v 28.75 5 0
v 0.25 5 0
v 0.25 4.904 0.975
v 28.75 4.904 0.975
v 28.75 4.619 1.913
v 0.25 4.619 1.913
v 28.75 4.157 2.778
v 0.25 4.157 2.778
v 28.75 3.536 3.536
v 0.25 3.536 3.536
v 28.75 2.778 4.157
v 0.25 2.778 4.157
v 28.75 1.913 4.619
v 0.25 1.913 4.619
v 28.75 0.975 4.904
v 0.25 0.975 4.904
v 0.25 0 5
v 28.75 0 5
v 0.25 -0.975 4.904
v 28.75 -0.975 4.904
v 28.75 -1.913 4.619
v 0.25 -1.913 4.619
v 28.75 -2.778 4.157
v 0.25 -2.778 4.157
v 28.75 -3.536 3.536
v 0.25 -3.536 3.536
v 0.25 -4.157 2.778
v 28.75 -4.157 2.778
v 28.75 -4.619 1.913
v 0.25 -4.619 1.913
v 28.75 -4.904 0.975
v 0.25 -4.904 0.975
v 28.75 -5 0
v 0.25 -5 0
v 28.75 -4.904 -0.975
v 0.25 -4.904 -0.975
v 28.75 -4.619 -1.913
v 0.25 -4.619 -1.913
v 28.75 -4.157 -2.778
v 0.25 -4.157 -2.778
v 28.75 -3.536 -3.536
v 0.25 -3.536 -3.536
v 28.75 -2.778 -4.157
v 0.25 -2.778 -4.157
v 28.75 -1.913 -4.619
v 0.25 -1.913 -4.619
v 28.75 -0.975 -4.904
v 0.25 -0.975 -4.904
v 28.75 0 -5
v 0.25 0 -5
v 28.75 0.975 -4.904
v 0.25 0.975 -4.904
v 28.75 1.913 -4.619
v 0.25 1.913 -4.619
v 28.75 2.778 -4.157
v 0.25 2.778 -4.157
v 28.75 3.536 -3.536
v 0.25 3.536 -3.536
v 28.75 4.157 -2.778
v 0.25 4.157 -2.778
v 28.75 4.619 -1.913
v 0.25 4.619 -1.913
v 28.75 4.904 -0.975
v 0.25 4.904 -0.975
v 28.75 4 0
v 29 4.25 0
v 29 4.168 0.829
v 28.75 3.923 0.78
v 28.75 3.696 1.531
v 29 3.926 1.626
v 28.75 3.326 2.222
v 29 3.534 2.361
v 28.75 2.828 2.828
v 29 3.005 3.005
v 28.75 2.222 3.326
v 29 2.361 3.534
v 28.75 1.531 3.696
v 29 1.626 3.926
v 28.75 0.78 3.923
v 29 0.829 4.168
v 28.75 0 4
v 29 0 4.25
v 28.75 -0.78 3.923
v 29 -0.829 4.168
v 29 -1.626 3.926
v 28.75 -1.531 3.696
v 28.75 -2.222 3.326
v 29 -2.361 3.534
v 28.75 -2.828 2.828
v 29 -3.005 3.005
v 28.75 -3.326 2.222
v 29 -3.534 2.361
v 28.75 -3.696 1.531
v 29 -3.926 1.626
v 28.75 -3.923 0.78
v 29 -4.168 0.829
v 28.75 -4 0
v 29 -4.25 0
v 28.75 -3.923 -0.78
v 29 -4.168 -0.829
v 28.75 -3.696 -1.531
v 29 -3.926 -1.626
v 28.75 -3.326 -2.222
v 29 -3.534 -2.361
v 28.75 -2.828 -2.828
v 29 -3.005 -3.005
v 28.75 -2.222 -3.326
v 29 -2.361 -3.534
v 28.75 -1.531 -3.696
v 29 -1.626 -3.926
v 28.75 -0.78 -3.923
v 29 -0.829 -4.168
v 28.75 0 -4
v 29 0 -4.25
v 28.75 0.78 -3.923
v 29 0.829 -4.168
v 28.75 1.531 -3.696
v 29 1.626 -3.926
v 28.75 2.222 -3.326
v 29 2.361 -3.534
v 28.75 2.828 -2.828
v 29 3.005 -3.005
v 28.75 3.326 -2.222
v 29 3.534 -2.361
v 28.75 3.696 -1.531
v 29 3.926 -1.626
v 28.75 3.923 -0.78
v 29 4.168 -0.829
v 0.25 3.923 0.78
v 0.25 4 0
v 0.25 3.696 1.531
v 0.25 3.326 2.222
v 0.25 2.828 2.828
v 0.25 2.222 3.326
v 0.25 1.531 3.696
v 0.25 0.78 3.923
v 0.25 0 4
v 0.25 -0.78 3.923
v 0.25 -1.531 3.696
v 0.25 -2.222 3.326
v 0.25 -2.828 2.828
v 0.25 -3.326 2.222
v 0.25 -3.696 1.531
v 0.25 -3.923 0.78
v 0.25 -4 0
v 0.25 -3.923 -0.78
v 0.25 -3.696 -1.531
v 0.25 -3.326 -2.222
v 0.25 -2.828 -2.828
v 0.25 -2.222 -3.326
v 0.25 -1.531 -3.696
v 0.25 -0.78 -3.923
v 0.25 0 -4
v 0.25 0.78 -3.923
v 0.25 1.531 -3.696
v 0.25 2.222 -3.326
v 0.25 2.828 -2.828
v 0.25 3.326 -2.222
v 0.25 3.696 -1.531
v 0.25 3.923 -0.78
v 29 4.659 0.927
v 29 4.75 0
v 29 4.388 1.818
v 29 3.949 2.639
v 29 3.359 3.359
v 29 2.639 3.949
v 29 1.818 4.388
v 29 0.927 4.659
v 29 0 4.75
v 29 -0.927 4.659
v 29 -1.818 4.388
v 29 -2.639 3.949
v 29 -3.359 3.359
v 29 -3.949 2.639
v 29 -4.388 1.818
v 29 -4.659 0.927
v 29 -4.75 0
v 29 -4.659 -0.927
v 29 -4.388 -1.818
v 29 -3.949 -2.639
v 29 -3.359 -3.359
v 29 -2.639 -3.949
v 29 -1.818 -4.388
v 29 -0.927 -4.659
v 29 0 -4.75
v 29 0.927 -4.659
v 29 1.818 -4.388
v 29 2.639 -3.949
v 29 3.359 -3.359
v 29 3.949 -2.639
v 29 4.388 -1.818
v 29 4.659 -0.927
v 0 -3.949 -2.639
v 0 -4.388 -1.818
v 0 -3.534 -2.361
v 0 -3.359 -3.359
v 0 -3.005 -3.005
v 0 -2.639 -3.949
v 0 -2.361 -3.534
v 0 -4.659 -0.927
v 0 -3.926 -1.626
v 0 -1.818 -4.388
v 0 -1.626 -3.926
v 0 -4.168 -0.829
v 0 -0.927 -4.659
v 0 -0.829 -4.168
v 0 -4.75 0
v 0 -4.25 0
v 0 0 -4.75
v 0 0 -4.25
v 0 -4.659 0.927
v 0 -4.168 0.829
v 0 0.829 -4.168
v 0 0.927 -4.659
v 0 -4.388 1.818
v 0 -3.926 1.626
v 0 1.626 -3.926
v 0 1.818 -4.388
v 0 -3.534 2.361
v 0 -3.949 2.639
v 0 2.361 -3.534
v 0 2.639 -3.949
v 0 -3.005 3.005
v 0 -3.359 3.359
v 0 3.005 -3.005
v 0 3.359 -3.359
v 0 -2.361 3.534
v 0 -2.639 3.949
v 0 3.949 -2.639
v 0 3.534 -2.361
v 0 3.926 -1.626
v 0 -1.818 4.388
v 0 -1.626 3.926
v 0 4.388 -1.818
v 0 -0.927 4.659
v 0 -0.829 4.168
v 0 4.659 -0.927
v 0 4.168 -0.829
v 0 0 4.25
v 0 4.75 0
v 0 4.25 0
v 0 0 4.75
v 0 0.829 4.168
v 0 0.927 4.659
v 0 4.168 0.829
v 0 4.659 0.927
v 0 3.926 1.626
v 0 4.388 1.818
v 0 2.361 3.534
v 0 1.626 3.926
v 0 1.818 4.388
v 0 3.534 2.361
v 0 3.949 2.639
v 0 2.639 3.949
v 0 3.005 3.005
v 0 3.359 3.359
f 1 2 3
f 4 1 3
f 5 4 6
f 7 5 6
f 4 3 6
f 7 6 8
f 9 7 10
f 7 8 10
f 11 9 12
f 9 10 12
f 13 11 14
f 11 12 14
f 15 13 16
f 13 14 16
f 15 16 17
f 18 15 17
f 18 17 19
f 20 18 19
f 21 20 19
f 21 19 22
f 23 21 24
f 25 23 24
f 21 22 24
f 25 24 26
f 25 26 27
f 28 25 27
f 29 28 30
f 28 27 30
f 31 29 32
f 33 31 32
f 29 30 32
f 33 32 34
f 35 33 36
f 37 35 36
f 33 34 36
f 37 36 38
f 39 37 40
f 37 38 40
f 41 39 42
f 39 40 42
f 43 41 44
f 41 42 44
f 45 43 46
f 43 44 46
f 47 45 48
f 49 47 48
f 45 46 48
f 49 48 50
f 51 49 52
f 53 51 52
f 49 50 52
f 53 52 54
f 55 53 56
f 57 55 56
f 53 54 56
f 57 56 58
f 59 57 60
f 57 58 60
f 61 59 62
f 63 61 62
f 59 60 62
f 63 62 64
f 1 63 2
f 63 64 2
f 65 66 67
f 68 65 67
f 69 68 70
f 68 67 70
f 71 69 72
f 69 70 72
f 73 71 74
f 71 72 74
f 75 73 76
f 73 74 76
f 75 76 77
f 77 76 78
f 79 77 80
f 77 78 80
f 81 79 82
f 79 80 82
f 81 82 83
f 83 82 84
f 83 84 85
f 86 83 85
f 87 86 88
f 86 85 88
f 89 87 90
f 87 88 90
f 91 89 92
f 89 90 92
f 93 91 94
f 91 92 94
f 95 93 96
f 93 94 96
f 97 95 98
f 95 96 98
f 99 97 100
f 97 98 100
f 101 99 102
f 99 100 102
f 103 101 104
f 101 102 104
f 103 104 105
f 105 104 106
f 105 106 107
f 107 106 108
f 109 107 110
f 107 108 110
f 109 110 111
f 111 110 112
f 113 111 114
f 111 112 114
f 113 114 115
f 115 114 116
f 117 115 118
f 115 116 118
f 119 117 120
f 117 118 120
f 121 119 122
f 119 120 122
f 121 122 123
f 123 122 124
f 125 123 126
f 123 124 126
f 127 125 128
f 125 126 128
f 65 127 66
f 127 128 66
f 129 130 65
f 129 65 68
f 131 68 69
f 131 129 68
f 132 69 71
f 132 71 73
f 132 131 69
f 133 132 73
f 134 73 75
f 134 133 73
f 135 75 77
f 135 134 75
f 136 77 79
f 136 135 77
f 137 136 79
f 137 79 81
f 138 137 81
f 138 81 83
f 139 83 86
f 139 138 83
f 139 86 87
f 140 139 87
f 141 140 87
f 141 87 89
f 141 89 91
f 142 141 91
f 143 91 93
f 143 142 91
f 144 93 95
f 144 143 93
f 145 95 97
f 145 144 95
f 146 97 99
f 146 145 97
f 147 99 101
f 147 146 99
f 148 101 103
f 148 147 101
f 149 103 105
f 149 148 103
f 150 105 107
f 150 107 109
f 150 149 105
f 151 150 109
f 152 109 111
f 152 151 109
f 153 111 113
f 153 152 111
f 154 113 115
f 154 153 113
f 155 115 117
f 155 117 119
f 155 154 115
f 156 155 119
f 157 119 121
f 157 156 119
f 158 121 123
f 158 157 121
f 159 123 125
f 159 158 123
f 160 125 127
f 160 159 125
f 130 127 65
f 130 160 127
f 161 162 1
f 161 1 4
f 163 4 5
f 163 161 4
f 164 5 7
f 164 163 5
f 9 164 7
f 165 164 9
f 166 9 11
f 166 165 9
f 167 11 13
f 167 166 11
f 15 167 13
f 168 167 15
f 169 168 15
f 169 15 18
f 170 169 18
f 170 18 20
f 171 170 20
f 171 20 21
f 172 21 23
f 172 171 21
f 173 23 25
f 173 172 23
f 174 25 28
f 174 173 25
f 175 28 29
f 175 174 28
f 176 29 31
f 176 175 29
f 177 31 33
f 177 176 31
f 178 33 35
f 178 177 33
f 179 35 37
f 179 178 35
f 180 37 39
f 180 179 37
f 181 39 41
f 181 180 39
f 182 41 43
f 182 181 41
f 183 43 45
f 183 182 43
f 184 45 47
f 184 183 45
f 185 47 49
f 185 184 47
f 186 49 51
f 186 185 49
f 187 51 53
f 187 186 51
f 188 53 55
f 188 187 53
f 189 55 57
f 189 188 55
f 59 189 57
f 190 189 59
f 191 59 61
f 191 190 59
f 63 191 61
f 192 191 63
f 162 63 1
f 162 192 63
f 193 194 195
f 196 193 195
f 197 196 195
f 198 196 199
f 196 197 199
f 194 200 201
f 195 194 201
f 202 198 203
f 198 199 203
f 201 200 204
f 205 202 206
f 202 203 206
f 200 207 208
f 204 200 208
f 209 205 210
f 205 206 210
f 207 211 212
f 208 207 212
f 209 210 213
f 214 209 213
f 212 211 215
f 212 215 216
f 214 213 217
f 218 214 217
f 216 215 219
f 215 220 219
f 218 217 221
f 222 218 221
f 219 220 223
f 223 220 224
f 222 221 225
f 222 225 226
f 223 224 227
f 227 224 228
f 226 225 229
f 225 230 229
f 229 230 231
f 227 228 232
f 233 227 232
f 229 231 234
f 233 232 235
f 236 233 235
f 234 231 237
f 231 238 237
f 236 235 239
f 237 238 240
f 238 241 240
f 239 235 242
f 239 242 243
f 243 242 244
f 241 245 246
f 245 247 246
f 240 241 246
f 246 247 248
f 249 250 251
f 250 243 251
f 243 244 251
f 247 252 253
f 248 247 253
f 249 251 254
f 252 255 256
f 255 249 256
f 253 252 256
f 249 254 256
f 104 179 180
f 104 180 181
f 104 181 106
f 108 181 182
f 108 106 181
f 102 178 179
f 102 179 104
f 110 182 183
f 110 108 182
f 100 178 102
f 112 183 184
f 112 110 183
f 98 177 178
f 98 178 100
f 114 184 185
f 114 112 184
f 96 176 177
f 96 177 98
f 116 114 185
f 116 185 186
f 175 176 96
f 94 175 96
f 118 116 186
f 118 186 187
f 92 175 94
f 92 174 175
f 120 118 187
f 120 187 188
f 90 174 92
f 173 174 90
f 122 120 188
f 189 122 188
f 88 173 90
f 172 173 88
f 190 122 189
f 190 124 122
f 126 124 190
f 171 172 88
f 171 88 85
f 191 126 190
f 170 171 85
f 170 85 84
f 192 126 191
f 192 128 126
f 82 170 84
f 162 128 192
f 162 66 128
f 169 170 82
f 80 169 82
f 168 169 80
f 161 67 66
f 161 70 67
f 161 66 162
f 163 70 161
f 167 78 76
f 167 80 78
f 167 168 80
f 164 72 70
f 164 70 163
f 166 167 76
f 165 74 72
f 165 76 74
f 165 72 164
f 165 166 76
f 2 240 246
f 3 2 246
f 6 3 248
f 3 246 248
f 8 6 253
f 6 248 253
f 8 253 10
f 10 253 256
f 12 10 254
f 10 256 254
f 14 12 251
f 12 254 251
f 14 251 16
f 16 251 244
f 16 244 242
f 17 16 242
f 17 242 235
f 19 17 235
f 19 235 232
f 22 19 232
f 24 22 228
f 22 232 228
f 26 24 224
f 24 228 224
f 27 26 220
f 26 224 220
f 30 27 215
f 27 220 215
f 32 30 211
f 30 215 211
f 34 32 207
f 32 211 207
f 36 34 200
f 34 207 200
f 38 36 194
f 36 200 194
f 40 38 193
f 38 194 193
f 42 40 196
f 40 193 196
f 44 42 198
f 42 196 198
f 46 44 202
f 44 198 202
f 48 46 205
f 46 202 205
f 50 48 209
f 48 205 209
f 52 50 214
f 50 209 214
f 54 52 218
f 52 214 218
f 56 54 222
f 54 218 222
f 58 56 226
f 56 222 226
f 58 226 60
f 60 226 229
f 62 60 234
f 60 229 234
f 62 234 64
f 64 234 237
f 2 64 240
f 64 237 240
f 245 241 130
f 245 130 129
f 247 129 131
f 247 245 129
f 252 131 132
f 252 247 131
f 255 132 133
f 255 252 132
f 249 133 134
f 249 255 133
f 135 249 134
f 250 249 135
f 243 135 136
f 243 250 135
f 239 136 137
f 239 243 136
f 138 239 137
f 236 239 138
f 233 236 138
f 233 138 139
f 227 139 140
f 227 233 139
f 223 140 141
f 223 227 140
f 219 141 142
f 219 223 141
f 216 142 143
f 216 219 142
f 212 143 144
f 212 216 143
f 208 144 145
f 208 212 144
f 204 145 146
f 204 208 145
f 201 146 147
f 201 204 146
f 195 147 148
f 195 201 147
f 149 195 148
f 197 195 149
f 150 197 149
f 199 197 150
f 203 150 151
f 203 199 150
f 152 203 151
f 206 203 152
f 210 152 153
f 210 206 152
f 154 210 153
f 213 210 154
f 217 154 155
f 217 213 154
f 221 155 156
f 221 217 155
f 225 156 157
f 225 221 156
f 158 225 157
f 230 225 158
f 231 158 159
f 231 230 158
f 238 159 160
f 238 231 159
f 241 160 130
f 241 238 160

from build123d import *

# Parameters (mm, degrees)
F0_R     = 5
F0_R_2   = 4
F1_DEPTH = 29
F2_SIZE  = 0.25


with BuildPart() as f1:
    # F0 (on Right) → F1 (new body)
    with BuildSketch(Plane.YZ):
        Circle(F0_R)
        Circle(F0_R_2, mode=Mode.SUBTRACT)
    extrude(amount=F1_DEPTH)

    # F2
    f2_edges = [f1.edges().sort_by_distance(p)[0] for p in [
        (29, -5, 0),
        (0, -5, 0),
        (0, -4, 0),
        (29, -4, 0),
    ]]
    chamfer(f2_edges, length=F2_SIZE)


solid = f1.part
